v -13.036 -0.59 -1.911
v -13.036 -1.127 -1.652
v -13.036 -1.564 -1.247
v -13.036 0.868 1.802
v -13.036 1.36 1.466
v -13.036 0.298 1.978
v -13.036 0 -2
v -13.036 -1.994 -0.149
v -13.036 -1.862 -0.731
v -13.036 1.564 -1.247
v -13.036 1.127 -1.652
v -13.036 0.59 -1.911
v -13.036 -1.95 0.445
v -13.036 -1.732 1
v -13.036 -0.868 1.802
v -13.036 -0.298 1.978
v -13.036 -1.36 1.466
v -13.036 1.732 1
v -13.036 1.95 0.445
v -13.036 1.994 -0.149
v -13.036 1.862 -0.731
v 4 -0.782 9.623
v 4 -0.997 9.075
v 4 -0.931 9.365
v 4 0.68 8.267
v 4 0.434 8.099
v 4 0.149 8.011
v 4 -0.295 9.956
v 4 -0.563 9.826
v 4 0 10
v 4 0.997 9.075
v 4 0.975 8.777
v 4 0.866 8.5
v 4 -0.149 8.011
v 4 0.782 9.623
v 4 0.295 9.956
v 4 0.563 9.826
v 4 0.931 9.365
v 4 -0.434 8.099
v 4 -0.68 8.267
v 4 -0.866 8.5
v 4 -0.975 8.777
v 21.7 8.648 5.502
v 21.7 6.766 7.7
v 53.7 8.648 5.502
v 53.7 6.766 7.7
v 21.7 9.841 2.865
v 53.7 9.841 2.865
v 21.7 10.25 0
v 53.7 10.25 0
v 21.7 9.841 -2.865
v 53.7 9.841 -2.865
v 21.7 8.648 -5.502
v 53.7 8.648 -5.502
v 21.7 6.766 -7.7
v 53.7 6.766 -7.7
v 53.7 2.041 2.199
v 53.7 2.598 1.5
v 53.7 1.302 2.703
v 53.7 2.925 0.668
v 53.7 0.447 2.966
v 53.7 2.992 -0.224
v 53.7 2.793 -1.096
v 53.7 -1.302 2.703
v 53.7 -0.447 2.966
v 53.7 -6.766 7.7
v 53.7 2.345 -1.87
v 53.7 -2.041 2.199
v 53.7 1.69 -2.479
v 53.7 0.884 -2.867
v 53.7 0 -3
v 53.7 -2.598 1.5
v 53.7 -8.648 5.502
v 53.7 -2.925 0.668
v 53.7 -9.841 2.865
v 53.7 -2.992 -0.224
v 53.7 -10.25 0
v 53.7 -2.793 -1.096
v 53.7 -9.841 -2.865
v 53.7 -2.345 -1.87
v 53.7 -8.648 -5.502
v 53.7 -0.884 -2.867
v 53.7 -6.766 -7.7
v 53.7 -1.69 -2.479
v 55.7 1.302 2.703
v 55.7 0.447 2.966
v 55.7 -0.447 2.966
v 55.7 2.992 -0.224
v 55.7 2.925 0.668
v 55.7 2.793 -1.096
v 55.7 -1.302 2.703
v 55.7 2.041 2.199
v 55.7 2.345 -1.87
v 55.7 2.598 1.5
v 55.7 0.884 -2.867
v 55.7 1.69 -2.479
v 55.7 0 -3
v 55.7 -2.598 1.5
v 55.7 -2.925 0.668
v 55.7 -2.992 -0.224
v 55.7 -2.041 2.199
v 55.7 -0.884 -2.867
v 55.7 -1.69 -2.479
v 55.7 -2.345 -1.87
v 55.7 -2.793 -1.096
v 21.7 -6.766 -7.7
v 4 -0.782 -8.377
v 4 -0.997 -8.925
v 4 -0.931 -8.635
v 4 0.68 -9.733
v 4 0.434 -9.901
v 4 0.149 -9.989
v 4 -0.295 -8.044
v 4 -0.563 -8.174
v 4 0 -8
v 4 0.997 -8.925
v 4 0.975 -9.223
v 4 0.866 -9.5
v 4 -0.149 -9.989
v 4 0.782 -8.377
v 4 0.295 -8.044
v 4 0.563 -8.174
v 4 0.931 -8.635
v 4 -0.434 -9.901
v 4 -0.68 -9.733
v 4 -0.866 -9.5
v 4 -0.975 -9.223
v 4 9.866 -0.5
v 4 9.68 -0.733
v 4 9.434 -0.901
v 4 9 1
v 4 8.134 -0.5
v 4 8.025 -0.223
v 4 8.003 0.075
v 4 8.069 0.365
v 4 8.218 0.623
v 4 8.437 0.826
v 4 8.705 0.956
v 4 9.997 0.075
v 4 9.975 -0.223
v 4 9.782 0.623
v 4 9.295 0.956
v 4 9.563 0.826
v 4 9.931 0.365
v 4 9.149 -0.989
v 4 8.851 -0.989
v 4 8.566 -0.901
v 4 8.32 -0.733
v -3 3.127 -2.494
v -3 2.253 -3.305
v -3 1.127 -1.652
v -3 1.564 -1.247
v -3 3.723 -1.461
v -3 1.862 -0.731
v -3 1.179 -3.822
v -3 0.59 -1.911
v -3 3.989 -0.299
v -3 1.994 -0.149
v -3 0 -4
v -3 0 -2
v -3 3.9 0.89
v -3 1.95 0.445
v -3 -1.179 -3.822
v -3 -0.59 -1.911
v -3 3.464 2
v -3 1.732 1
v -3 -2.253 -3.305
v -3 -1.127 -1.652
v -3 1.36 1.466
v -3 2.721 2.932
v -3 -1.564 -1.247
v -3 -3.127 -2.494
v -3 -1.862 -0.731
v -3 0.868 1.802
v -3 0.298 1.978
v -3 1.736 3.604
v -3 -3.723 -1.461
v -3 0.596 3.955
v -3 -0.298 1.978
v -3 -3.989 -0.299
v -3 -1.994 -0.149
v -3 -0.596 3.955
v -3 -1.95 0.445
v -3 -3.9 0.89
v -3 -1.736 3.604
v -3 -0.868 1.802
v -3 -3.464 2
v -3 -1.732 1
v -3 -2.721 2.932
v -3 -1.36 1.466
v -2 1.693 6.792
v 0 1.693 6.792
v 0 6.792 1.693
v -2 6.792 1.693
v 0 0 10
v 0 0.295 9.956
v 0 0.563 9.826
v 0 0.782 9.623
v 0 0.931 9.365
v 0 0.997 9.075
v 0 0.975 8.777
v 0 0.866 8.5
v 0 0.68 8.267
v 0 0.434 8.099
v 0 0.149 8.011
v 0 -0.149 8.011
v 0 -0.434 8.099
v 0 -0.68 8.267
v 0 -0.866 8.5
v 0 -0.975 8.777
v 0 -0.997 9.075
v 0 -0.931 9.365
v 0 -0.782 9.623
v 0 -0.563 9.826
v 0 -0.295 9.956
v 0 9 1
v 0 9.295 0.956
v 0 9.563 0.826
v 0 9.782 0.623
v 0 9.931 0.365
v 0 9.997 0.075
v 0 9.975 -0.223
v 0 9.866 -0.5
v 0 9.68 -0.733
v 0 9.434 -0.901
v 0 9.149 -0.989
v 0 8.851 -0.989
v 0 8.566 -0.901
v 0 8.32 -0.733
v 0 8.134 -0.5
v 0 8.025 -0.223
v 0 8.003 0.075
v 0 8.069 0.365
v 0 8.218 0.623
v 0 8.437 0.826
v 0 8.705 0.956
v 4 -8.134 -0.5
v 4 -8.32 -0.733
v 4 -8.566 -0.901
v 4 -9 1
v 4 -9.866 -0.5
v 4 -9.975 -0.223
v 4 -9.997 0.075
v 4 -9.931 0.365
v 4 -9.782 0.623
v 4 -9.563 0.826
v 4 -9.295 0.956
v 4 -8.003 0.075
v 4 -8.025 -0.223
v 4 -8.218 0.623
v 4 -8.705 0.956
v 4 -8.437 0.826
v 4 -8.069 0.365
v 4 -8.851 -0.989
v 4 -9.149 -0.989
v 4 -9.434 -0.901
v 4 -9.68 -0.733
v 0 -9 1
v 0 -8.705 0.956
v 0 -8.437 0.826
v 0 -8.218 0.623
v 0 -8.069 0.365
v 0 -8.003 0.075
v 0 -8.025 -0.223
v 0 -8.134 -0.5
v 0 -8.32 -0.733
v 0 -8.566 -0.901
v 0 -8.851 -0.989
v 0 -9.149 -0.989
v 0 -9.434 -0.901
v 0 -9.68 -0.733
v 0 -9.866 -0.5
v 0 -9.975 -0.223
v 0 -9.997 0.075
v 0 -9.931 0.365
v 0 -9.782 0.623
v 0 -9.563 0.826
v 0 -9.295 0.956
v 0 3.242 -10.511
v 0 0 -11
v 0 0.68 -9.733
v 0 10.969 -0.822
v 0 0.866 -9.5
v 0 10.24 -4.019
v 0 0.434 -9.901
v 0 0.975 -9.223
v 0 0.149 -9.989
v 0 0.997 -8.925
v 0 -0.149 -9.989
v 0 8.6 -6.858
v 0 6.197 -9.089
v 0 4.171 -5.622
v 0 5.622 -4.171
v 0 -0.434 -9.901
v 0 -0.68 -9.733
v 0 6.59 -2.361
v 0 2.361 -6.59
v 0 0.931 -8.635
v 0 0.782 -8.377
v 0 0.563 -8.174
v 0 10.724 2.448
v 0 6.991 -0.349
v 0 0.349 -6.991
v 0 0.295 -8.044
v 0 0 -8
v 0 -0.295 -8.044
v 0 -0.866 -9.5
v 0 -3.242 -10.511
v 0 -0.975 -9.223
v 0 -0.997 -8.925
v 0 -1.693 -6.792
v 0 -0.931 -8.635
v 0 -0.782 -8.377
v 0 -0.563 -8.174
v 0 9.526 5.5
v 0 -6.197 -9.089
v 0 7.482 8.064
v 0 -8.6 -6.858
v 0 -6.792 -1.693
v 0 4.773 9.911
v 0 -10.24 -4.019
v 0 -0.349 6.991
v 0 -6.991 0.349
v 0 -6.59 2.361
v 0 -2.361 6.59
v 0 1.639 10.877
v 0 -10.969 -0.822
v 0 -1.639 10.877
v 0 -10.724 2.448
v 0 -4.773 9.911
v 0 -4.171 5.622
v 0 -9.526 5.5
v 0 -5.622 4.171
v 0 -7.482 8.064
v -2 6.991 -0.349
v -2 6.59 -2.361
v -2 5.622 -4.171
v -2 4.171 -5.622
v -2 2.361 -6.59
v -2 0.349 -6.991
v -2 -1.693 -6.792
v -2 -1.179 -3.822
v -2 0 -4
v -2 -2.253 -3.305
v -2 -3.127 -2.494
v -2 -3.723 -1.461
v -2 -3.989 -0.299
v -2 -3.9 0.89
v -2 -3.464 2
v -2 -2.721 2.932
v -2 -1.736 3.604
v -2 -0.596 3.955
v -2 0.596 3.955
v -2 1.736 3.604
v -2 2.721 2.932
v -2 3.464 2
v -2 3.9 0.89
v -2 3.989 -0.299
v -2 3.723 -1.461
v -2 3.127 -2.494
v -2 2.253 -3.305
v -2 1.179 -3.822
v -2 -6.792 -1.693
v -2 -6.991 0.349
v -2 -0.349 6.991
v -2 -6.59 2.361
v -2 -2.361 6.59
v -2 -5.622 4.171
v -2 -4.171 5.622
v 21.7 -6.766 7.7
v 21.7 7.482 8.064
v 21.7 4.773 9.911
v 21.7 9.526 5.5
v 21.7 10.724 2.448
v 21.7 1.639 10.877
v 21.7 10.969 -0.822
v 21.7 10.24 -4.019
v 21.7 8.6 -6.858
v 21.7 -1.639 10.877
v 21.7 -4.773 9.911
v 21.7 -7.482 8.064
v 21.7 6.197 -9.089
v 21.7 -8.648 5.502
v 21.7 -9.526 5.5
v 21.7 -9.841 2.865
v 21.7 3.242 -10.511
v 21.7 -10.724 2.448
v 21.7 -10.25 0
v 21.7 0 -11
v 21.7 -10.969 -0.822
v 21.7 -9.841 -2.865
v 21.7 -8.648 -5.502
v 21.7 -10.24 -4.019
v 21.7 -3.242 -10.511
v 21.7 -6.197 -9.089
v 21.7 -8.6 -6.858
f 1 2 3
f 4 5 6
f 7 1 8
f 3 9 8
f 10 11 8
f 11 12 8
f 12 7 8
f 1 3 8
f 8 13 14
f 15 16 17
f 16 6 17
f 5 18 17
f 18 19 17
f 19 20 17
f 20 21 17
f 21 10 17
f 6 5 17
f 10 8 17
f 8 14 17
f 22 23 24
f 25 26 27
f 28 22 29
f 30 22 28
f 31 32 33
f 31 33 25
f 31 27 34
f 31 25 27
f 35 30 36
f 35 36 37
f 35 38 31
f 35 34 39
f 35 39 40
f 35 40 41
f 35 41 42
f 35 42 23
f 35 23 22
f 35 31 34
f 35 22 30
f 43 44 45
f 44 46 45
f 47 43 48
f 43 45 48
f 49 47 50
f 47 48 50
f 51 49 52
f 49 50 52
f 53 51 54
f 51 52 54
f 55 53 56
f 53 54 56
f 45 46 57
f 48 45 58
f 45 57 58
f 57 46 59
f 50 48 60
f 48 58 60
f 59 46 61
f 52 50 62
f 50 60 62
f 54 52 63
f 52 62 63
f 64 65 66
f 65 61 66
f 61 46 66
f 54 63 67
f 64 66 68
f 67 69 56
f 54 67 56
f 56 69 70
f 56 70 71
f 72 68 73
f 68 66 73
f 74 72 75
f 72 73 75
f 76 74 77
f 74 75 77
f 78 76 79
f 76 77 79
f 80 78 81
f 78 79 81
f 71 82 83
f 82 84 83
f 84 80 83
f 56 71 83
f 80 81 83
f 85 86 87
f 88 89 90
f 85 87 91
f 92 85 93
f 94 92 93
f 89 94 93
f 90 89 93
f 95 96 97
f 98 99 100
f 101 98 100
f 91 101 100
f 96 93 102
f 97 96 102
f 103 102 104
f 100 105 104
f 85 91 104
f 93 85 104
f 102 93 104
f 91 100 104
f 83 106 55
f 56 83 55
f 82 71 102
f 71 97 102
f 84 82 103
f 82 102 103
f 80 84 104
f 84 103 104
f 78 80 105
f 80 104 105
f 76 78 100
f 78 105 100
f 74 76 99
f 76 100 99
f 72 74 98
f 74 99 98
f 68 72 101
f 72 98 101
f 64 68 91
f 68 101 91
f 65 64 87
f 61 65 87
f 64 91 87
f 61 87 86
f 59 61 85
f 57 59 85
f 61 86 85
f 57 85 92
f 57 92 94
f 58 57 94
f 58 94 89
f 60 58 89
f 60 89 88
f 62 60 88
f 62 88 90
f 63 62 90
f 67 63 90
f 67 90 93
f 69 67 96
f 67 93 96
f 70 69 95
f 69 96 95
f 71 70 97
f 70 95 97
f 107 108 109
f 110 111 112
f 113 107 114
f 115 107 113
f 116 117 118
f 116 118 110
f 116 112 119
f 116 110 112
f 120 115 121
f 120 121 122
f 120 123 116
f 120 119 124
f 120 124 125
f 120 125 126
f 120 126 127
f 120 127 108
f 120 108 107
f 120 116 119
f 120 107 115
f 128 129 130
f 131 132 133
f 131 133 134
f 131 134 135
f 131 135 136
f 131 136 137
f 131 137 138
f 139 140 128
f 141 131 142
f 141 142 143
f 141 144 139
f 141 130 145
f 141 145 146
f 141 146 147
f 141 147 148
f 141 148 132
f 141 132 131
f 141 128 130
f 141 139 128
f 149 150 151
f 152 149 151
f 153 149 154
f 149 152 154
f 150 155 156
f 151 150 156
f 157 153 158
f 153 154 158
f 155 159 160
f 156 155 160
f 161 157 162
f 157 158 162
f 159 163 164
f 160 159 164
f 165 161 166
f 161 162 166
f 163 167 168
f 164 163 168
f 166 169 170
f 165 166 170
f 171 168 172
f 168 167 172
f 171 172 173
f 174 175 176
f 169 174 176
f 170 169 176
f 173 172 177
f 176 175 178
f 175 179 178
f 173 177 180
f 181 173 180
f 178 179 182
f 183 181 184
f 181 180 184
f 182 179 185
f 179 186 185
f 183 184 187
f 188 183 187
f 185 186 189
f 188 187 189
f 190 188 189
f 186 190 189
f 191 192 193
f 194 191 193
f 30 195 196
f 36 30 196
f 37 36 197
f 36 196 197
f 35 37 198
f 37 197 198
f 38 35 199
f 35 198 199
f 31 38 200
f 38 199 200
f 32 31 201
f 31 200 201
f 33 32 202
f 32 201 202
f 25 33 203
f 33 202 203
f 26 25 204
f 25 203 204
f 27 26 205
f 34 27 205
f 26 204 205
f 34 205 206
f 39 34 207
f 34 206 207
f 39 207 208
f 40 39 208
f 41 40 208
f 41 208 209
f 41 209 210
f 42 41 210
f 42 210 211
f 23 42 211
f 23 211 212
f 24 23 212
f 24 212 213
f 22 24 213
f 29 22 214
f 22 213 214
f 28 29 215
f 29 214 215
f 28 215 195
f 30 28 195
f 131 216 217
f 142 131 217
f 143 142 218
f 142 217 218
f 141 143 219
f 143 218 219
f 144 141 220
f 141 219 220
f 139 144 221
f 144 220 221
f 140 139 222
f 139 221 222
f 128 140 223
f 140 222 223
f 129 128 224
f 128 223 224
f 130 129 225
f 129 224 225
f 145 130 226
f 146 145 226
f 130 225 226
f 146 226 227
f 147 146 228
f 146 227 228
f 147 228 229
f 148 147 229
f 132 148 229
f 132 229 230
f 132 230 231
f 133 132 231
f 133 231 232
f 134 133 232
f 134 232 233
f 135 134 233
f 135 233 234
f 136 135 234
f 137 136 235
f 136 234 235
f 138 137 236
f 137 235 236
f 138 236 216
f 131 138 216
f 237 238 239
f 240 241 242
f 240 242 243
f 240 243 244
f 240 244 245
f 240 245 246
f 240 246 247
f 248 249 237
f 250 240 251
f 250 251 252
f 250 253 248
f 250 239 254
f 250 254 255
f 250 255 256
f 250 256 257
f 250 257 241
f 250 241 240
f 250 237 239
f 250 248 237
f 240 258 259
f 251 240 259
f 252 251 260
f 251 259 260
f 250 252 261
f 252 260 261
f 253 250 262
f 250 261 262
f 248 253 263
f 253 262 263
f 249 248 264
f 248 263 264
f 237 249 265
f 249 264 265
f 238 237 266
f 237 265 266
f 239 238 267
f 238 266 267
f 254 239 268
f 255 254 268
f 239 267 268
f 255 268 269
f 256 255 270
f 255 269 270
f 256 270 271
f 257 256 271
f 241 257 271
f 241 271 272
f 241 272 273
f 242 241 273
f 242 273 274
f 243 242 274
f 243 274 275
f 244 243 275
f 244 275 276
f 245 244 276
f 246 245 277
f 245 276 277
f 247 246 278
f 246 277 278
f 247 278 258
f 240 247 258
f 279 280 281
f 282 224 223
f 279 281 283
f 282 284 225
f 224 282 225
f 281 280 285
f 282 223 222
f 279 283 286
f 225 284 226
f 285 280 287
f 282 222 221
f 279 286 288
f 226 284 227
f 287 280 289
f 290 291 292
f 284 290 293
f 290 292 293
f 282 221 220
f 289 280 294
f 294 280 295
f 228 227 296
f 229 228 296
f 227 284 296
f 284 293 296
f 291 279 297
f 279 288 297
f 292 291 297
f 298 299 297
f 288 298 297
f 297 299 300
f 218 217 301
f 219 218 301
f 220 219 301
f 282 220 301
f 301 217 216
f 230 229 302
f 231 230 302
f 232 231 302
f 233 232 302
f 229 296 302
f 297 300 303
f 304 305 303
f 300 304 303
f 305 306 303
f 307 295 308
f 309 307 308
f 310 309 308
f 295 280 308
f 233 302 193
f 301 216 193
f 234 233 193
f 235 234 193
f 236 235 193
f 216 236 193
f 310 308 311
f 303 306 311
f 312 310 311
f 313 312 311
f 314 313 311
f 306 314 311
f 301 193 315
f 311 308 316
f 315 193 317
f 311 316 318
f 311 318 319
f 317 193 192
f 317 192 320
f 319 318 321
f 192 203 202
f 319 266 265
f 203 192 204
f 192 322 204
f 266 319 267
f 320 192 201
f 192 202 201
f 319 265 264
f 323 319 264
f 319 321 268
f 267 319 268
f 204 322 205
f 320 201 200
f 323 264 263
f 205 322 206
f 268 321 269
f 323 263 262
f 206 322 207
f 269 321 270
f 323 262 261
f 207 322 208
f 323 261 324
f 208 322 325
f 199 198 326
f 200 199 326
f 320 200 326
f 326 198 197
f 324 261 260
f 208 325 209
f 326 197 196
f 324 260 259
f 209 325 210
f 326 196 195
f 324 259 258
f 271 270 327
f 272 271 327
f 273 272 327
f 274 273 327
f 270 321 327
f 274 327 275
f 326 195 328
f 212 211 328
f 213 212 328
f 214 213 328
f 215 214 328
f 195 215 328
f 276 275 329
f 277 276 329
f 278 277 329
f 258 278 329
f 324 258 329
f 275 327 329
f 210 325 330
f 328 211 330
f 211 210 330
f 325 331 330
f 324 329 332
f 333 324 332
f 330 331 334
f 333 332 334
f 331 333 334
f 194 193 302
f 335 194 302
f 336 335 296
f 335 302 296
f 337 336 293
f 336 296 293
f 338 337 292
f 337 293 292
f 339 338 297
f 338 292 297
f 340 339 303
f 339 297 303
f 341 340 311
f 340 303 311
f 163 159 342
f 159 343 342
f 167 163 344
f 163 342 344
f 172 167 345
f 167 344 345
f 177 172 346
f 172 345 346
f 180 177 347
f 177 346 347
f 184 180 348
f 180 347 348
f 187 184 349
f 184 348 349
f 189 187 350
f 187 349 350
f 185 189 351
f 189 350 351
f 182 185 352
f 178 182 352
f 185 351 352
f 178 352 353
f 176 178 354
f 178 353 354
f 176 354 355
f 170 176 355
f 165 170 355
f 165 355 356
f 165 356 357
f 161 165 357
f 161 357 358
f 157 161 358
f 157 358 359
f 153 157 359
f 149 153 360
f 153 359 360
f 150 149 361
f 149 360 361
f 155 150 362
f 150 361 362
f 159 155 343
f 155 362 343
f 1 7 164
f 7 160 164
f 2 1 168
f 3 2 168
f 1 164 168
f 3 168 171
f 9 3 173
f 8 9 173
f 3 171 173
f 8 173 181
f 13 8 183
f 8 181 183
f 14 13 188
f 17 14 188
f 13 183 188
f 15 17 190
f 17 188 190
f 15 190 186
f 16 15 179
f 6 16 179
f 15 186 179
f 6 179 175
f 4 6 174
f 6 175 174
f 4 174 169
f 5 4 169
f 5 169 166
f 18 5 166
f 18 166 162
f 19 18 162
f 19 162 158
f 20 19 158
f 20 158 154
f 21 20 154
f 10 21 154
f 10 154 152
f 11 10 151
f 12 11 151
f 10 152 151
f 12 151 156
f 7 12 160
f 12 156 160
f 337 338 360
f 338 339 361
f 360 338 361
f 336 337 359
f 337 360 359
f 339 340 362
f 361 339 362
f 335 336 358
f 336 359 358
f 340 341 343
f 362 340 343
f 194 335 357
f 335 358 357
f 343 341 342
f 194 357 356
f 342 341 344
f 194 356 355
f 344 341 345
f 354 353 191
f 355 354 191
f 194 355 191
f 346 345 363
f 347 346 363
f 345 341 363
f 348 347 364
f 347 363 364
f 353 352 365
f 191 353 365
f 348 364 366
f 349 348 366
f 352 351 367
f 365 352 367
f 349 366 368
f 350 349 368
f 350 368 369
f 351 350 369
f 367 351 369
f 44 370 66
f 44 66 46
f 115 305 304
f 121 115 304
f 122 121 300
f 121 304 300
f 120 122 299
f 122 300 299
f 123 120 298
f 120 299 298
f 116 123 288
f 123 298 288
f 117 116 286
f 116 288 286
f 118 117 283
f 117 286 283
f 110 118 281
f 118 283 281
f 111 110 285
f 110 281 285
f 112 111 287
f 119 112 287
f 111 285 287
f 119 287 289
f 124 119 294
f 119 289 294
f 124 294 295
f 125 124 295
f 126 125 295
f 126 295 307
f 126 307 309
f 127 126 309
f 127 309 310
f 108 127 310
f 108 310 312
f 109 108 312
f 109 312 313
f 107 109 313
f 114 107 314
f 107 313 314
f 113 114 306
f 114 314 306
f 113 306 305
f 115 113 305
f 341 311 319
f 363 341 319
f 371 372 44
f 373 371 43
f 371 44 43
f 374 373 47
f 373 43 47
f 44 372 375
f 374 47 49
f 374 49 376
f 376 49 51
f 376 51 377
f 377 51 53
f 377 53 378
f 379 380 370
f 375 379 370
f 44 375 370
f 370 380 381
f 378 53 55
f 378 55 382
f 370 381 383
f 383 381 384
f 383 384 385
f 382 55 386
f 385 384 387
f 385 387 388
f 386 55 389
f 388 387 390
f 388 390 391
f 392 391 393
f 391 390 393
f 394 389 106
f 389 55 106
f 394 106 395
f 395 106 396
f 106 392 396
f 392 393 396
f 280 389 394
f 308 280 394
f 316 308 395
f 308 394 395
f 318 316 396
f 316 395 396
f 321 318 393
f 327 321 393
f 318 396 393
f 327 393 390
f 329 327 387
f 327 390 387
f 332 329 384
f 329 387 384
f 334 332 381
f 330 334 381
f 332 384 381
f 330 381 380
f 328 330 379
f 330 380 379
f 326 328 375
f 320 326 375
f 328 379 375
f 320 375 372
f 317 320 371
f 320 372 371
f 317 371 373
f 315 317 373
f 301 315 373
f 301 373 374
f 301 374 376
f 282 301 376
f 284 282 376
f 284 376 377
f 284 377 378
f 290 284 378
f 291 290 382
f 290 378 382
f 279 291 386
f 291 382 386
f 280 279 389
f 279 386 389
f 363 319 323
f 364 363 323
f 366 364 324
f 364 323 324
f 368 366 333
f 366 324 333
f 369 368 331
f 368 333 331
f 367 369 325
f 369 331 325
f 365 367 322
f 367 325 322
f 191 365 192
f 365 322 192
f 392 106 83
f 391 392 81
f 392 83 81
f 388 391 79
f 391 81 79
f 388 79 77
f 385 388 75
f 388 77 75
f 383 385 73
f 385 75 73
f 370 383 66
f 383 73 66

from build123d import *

# Parameters (mm, degrees)
ESQUISSE2_W             = 8.320302529
ESQUISSE2_H             = 23.371875391
ESQUISSE2_W_2           = 7.922092332
ENL_V_MAT_EXTRU_1_DEPTH = 32
ENL_V_START             = -2
ENL_V_MAT_EXTRU_2_DEPTH = 2
ESQUISSE4_R             = 1
ENL_V_MAT_EXTRU_3_DEPTH = 4


with BuildPart() as part:
    # Esquisse1 → Révolution1 (revolve)
    with BuildSketch(Plane.XY, mode=Mode.PRIVATE) as r_volution1_sk:
        Polygon((-13.035736805, 0), (-13.035736805, -2), (-3, -2), (-3, -4), (-2, -4), (-2, -7), (0, -7), (0, -11), (21.7, -11), (21.7, -10.25), (53.7, -10.25), (53.7, -3), (55.7, -3), (55.7, 0), align=None)
    revolve(r_volution1_sk.sketch.rotate(Axis((38.703399471, 0, 0), (-1, 0, 0)), 270), axis=Axis((38.703399471, 0, 0), (-1, 0, 0)))

    # Esquisse2 → Enlèv. mat.-Extru.1 (cut)
    with BuildSketch(Plane(origin=(53.7, 0, 0), x_dir=(0, 0, -1), z_dir=(1, 0, 0))):
        with Locations((-11.860151265, -0.490104857)):
            Rectangle(ESQUISSE2_W, ESQUISSE2_H)
        with Locations((11.661046166, -0.490104857)):
            Rectangle(ESQUISSE2_W_2, ESQUISSE2_H)
    extrude(amount=-ENL_V_MAT_EXTRU_1_DEPTH, mode=Mode.SUBTRACT)

    # Esquisse3 → Enlèv. mat.-Extru.2 (cut)
    with BuildSketch(Plane.ZY.offset(2).offset(ENL_V_START)):
        with BuildLine():
            Line((6.792150444, 1.69313093), (1.69313093, 6.792150444))
            ThreePointArc((1.69313093, 6.792150444), (4.949747468, 4.949747468), (6.792150444, 1.69313093))
        make_face()
        with BuildLine():
            Line((-6.792150444, -1.69313093), (-1.69313093, -6.792150444))
            ThreePointArc((-1.69313093, -6.792150444), (-4.949747468, -4.949747468), (-6.792150444, -1.69313093))
        make_face()
    extrude(amount=ENL_V_MAT_EXTRU_2_DEPTH, mode=Mode.SUBTRACT)

    # Esquisse4 → Enlèv. mat.-Extru.3 (cut)
    with BuildSketch(Plane.ZY):
        with Locations((0, 9)):
            Circle(ESQUISSE4_R)
        with Locations((-9, 0)):
            Circle(ESQUISSE4_R)
        with Locations((0, -9)):
            Circle(ESQUISSE4_R)
        with Locations((9, 0)):
            Circle(ESQUISSE4_R)
    extrude(amount=-ENL_V_MAT_EXTRU_3_DEPTH, mode=Mode.SUBTRACT)


solid = part.part
